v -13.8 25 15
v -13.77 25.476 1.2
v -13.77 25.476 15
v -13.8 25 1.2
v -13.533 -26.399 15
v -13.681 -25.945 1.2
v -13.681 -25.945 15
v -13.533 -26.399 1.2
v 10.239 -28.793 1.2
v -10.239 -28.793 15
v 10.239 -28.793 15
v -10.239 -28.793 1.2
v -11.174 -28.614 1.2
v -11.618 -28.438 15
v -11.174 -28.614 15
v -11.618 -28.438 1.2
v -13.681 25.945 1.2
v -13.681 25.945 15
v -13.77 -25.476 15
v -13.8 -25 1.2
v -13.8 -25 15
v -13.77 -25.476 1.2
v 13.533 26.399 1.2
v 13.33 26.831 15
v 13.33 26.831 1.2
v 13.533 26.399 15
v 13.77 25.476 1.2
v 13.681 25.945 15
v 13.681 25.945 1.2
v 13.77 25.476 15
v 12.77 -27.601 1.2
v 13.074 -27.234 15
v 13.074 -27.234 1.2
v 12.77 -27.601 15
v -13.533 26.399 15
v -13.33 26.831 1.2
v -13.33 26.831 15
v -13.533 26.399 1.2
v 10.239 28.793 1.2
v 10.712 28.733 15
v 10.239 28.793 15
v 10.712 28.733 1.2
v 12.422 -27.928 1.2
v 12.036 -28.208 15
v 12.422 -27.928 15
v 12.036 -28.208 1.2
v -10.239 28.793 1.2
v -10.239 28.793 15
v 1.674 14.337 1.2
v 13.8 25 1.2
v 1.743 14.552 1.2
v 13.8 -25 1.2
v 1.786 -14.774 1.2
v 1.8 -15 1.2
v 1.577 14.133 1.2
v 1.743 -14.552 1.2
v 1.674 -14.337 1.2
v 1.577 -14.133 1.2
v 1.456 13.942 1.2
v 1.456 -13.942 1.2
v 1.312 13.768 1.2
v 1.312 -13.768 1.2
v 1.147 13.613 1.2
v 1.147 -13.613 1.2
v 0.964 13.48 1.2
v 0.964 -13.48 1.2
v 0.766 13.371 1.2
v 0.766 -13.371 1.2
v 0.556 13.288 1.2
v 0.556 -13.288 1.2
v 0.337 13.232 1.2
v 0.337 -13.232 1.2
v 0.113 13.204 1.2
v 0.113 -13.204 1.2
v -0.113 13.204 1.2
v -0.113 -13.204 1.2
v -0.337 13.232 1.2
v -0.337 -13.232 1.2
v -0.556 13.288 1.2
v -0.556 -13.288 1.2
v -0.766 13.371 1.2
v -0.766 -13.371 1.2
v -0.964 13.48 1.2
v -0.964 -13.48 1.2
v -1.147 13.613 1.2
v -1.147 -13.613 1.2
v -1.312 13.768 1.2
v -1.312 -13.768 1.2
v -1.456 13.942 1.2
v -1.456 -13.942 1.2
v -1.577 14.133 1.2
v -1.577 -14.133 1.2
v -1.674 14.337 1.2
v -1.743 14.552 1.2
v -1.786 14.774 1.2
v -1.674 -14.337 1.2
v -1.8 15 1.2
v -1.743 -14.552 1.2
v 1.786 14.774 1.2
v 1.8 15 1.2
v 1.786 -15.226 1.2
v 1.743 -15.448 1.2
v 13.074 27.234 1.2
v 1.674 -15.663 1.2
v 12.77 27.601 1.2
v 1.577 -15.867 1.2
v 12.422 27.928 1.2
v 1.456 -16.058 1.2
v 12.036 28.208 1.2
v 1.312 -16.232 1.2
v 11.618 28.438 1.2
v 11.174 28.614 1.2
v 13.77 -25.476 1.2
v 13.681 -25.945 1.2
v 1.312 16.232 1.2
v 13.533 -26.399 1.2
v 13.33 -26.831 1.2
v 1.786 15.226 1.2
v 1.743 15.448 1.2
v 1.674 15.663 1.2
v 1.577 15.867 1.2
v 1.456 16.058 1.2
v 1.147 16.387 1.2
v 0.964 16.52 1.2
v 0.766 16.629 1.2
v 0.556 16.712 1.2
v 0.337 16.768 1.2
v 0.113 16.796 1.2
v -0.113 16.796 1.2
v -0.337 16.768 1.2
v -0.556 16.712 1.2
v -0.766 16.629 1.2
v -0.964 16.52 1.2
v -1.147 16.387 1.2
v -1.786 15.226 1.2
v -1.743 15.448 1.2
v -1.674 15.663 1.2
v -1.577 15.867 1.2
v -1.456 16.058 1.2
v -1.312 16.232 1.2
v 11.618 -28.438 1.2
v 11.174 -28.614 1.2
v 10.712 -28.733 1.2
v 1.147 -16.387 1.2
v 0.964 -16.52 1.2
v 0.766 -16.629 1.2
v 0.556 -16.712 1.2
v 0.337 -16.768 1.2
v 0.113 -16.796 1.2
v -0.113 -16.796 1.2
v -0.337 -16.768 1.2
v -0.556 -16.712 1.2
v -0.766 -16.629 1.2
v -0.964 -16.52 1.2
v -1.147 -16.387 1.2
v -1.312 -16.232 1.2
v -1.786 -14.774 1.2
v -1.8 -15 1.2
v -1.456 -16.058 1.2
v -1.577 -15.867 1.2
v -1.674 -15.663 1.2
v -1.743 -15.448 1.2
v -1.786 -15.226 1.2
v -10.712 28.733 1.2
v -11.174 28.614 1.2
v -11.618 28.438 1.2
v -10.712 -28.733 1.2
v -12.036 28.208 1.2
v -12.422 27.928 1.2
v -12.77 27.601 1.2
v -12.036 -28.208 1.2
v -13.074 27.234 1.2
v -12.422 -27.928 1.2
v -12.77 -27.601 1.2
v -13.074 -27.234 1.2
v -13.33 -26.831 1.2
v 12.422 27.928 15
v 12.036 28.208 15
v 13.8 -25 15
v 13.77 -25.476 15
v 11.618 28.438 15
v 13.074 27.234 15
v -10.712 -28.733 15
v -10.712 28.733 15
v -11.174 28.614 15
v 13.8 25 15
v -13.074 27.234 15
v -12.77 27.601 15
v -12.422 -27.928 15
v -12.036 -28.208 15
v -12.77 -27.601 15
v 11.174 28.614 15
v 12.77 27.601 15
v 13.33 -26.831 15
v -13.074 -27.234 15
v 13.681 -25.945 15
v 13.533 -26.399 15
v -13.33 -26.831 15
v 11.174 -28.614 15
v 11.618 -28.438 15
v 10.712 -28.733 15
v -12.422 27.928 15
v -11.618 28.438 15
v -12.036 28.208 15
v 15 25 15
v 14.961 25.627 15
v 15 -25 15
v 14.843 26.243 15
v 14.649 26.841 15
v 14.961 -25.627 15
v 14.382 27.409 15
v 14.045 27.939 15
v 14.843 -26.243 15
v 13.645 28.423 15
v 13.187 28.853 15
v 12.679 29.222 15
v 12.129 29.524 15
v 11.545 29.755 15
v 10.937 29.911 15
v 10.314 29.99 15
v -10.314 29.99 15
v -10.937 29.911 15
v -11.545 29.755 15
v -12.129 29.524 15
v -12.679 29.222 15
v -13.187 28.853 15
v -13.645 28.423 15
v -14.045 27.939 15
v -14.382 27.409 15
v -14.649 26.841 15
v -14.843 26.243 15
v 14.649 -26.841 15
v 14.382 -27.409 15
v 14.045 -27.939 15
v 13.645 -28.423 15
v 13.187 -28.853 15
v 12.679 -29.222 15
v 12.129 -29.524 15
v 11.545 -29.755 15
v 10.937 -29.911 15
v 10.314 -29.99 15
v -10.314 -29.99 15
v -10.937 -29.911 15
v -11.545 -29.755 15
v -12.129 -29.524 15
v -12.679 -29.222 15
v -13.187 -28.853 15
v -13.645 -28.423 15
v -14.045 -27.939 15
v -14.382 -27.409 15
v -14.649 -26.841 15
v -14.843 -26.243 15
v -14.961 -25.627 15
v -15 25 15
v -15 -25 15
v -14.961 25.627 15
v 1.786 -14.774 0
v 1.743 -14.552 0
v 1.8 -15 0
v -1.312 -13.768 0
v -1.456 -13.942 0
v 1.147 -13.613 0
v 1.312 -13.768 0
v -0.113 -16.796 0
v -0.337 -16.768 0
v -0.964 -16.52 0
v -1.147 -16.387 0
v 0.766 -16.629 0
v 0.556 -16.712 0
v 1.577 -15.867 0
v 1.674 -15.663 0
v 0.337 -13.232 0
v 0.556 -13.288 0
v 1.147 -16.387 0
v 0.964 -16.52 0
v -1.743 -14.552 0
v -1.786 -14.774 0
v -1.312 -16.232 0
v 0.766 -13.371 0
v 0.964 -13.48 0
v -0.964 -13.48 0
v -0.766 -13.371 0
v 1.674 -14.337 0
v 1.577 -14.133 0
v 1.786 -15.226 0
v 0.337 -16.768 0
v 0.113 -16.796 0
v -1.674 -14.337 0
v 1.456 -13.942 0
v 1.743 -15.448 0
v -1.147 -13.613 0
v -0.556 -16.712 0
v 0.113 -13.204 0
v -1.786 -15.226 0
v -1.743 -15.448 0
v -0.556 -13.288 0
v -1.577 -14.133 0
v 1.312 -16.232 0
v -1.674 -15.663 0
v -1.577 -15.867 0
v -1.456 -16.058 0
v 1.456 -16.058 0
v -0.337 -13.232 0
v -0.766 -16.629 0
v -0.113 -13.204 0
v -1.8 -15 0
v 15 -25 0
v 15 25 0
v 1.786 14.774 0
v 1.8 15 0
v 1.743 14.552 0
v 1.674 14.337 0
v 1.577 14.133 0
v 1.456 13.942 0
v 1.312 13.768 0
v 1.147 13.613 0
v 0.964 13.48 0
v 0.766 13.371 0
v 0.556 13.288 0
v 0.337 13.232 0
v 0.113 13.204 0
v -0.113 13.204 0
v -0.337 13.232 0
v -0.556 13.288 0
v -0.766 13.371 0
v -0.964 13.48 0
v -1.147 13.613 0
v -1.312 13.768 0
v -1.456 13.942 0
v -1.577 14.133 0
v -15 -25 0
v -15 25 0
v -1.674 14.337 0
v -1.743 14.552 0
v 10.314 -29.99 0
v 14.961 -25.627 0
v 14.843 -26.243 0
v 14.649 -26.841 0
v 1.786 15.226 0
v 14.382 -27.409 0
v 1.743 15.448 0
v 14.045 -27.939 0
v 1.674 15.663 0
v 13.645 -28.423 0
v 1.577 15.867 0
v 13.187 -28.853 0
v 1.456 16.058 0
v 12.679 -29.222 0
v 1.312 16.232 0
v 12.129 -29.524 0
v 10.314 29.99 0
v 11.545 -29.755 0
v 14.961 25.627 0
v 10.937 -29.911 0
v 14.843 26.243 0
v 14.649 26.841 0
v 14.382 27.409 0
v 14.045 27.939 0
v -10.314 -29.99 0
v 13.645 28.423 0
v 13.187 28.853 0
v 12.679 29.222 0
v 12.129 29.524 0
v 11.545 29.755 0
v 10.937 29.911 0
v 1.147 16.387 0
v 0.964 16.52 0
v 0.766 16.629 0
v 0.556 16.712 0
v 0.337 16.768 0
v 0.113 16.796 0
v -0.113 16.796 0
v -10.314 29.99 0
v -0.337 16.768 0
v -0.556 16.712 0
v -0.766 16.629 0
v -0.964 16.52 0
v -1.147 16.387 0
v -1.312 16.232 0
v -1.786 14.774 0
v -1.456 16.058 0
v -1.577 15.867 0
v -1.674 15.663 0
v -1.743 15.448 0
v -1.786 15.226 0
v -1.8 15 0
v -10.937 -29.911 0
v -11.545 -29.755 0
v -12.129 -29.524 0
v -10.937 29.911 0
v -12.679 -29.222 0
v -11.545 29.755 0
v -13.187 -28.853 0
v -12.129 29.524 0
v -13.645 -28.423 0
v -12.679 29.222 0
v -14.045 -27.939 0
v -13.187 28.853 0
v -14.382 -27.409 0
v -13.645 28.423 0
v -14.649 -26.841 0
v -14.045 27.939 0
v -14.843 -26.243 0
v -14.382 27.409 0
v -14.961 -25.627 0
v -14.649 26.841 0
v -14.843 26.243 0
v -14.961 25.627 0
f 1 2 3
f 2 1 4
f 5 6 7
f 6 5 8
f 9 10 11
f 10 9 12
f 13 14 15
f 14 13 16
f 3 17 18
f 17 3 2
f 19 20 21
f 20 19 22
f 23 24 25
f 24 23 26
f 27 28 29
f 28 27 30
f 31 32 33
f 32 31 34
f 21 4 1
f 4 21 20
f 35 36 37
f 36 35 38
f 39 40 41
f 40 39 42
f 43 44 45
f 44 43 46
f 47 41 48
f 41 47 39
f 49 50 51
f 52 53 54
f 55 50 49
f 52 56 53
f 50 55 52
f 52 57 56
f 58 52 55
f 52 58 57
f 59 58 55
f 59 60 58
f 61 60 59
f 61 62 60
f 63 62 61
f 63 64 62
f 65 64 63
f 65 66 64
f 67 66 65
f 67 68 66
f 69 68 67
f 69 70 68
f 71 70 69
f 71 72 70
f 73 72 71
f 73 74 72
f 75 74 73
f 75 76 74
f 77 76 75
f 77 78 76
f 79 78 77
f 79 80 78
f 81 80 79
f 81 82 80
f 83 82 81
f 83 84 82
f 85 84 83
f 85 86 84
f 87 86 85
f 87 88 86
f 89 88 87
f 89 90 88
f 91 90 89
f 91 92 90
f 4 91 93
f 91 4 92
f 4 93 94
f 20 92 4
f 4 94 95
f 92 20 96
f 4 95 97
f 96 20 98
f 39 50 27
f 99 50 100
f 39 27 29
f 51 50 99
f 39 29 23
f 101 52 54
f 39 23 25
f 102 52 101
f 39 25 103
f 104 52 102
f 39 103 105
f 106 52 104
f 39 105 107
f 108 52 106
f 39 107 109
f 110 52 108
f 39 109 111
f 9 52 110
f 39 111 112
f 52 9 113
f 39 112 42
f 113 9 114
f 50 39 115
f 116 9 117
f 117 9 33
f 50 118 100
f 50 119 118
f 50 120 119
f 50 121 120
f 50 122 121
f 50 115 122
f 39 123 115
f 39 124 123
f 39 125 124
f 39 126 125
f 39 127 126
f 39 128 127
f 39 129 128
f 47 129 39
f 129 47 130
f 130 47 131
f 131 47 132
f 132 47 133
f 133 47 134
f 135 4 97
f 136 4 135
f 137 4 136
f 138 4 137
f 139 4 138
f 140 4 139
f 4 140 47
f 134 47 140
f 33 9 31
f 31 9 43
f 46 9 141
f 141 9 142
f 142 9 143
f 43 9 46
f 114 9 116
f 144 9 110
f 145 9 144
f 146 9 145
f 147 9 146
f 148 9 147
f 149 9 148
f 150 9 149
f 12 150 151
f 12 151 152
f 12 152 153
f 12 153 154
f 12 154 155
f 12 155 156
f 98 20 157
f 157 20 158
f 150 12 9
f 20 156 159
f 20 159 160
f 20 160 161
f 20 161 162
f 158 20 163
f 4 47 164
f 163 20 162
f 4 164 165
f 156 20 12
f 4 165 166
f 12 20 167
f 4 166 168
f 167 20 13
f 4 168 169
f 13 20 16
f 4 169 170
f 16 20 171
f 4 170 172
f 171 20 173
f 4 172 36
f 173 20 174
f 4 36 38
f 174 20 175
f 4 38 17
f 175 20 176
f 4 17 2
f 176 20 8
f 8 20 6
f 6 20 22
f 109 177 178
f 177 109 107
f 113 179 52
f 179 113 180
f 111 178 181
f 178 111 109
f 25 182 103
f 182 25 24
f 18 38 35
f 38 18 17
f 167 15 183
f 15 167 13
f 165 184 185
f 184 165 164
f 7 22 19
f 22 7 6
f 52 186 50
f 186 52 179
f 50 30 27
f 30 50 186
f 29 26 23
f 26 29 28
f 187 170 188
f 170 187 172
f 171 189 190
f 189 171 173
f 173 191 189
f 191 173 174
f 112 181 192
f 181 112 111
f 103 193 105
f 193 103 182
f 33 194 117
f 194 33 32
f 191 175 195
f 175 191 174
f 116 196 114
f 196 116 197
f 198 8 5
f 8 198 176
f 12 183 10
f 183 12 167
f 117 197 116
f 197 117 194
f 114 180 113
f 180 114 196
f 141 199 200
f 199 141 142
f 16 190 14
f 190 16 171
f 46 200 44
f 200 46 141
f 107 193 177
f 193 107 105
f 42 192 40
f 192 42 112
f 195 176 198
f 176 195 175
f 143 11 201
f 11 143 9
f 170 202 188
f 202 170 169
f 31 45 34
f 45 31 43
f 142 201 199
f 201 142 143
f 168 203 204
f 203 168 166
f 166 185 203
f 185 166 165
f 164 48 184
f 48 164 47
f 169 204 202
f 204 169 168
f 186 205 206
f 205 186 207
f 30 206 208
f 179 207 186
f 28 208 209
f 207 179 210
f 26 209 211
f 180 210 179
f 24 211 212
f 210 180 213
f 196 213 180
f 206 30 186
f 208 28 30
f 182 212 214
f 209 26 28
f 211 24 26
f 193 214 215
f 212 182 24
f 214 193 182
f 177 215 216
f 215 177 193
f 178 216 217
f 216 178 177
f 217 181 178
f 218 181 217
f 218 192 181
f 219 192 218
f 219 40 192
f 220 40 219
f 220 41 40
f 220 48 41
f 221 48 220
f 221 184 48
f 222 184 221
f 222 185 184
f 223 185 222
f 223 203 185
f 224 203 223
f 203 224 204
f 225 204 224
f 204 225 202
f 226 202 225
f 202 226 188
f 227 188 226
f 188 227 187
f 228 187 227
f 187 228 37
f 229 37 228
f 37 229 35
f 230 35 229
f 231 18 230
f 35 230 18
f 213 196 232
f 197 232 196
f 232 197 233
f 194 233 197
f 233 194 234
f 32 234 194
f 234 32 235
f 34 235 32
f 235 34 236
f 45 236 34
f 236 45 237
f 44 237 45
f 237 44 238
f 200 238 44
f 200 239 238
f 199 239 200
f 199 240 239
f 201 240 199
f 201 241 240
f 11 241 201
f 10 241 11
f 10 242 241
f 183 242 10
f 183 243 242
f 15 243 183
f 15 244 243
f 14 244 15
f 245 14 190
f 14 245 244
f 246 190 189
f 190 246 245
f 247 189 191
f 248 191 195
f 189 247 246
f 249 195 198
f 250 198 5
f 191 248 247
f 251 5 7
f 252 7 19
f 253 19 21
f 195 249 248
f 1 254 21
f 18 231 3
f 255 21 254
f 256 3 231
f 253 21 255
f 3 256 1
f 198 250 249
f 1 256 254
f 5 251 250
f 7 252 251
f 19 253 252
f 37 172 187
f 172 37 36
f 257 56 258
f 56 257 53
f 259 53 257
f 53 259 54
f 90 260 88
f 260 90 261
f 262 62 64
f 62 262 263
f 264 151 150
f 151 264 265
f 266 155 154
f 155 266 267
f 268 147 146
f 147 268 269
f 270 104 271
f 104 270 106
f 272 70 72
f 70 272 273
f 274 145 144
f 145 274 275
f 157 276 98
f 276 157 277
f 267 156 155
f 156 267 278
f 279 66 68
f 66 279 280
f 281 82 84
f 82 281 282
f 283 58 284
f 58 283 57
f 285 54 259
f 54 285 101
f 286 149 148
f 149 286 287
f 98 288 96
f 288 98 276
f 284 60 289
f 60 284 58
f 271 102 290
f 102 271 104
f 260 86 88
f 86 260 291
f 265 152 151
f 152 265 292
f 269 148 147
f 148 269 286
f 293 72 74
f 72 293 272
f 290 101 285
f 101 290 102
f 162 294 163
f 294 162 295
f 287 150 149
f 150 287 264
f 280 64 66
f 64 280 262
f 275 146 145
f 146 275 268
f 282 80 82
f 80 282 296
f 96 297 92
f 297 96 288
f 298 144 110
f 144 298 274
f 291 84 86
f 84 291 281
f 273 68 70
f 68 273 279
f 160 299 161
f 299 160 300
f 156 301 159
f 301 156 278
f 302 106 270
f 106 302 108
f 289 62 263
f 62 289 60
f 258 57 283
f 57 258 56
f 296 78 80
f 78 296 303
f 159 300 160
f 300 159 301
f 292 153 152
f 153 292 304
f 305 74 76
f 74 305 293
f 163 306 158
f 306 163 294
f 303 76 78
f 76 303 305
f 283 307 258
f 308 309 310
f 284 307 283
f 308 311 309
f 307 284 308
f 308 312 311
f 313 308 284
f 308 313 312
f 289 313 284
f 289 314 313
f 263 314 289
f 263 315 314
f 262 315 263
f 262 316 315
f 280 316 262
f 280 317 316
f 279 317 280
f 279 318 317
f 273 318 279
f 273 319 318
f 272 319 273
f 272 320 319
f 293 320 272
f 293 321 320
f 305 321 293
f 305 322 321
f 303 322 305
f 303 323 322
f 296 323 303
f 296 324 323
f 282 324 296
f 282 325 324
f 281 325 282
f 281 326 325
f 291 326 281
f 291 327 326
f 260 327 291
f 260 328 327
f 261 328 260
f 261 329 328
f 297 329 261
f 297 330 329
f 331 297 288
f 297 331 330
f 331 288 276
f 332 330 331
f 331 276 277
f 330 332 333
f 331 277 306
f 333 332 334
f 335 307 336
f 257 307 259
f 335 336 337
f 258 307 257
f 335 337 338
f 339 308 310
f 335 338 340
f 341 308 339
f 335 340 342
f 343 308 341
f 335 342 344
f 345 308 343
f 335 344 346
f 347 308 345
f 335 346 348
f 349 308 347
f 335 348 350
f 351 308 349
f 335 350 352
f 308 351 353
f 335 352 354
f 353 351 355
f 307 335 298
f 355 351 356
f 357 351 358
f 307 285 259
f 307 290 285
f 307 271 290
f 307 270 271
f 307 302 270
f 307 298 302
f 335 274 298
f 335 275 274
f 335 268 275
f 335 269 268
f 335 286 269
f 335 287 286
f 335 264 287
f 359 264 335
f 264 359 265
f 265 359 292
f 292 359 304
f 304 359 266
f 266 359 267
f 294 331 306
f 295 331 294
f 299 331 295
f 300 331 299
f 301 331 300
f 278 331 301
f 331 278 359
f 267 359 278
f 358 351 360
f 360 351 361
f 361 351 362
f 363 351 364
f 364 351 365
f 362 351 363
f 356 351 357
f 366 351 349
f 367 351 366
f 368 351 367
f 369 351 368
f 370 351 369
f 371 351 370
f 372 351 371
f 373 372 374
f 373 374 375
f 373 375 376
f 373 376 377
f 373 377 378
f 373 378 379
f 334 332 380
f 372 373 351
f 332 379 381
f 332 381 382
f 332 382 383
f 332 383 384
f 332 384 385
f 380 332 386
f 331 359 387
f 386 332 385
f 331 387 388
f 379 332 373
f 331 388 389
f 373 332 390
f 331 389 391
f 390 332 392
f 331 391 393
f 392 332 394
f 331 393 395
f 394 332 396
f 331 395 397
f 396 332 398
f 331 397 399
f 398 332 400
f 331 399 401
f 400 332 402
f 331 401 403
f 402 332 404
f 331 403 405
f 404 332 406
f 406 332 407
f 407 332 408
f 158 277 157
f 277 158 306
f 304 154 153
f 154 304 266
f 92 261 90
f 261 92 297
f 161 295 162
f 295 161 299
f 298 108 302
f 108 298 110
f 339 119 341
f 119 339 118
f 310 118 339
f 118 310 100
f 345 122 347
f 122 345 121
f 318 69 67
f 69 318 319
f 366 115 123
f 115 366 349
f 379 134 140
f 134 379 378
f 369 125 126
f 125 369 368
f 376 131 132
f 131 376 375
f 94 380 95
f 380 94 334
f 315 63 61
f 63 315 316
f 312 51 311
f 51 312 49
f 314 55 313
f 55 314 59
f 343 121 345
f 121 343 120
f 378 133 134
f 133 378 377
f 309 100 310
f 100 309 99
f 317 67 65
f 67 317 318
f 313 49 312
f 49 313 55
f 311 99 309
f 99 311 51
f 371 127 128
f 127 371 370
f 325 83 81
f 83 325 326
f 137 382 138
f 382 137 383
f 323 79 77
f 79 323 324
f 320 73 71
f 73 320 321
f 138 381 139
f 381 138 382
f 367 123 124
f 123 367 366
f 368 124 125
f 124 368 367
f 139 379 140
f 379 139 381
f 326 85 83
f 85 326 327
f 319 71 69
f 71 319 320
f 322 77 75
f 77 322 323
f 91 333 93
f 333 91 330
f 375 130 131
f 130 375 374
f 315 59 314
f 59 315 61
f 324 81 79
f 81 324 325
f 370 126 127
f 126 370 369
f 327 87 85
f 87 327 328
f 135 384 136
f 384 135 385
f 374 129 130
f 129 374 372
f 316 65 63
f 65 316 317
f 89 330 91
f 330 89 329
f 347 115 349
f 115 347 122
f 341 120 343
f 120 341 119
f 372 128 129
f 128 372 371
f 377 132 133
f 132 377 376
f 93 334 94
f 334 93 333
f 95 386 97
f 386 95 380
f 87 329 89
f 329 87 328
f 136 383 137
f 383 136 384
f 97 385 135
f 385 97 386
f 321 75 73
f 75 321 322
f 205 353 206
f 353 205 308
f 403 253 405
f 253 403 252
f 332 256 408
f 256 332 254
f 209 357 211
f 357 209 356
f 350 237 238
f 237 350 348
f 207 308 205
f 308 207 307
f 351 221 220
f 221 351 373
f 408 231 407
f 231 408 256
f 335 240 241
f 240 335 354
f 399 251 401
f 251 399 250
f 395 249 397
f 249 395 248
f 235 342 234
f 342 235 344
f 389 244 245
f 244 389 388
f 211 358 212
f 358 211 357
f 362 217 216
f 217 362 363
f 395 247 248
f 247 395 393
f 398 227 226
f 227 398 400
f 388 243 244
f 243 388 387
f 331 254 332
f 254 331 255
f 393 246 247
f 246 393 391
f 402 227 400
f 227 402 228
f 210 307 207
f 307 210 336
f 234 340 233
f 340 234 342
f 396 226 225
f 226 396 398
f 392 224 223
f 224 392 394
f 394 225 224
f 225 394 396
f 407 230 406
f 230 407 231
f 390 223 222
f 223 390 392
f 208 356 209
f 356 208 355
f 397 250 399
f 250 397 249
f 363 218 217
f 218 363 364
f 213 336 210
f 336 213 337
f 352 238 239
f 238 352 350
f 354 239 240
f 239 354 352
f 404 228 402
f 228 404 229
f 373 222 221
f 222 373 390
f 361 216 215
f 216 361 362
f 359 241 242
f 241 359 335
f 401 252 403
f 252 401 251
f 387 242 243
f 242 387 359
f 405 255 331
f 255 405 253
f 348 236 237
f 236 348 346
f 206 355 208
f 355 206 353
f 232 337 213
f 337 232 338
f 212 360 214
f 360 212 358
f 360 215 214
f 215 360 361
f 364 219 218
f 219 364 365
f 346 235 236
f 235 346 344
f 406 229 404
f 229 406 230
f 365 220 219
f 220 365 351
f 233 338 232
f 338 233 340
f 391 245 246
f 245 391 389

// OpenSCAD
$fn = 50;


difference() {
	union() {
		hull() {
			translate(v = [-10.0000000000, 25.0000000000, 0]) {
				cylinder(h = 15, r = 5);
			}
			translate(v = [10.0000000000, 25.0000000000, 0]) {
				cylinder(h = 15, r = 5);
			}
			translate(v = [-10.0000000000, -25.0000000000, 0]) {
				cylinder(h = 15, r = 5);
			}
			translate(v = [10.0000000000, -25.0000000000, 0]) {
				cylinder(h = 15, r = 5);
			}
		}
	}
	union() {
		translate(v = [0, 0, 1.2000000000]) {
			hull() {
				translate(v = [-10.0000000000, 25.0000000000, 0]) {
					cylinder(h = 13.8000000000, r = 3.8000000000);
				}
				translate(v = [10.0000000000, 25.0000000000, 0]) {
					cylinder(h = 13.8000000000, r = 3.8000000000);
				}
				translate(v = [-10.0000000000, -25.0000000000, 0]) {
					cylinder(h = 13.8000000000, r = 3.8000000000);
				}
				translate(v = [10.0000000000, -25.0000000000, 0]) {
					cylinder(h = 13.8000000000, r = 3.8000000000);
				}
			}
		}
		#translate(v = [0.0000000000, -15.0000000000, 0]) {
			cylinder(h = 1.2000000000, r = 1.8000000000);
		}
		#translate(v = [0.0000000000, 15.0000000000, 0]) {
			cylinder(h = 1.2000000000, r = 1.8000000000);
		}
	}
}
